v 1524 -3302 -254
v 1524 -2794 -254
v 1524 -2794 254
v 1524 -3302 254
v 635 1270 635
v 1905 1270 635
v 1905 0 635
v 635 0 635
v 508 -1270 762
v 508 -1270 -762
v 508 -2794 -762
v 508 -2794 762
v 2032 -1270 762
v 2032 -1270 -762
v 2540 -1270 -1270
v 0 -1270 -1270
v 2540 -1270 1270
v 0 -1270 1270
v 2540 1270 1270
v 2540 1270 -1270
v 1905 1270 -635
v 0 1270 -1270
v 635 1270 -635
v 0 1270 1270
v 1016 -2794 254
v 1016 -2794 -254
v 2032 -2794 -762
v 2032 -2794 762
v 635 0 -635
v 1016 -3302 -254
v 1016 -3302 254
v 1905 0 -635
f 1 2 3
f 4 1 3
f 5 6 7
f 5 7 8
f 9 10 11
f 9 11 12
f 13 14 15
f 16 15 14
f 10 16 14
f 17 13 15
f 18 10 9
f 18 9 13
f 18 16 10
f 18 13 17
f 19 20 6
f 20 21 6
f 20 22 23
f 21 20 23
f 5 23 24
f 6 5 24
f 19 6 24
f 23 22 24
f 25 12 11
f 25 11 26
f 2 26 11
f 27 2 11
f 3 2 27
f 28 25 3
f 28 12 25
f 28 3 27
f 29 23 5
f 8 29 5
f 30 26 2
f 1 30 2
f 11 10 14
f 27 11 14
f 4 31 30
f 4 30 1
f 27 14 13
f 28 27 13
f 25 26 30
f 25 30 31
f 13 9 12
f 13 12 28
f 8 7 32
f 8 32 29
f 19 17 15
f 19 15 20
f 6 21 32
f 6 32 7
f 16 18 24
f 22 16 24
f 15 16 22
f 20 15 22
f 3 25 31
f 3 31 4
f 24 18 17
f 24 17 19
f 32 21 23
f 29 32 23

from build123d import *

# Parameters (mm, degrees)
F0_W     = 2540
F0_H     = 2540
F1_DEPTH = 2540
F2_W     = 1524
F2_H     = 1524
F3_DEPTH = 1524
F4_W     = 508
F4_H     = 508
F5_DEPTH = 508
F6_W     = 1270
F6_H     = 1270
F7_DEPTH = 1270


with BuildPart() as f1:
    # F0 (on Right) → F1 (new body)
    with BuildSketch(Plane.YZ):
        Rectangle(F0_W, F0_H)
    extrude(amount=F1_DEPTH)

    # F2 (on face) → F3 (join)
    with BuildSketch(Plane.XZ.offset(1270)):
        with Locations((1270, 0)):
            Rectangle(F2_W, F2_H)
    extrude(amount=F3_DEPTH)

    # F4 (on face) → F5 (join)
    with BuildSketch(Plane.XZ.offset(2794)):
        with Locations((1270, 0)):
            Rectangle(F4_W, F4_H)
    extrude(amount=F5_DEPTH)

    # F6 (on face) → F7 (cut)
    with BuildSketch(Plane(origin=(0, 1270, 0), x_dir=(-1, 0, 0), z_dir=(0, 1, 0))):
        with Locations((-1270, 0)):
            Rectangle(F6_W, F6_H)
    extrude(amount=-F7_DEPTH, mode=Mode.SUBTRACT)


solid = f1.part
